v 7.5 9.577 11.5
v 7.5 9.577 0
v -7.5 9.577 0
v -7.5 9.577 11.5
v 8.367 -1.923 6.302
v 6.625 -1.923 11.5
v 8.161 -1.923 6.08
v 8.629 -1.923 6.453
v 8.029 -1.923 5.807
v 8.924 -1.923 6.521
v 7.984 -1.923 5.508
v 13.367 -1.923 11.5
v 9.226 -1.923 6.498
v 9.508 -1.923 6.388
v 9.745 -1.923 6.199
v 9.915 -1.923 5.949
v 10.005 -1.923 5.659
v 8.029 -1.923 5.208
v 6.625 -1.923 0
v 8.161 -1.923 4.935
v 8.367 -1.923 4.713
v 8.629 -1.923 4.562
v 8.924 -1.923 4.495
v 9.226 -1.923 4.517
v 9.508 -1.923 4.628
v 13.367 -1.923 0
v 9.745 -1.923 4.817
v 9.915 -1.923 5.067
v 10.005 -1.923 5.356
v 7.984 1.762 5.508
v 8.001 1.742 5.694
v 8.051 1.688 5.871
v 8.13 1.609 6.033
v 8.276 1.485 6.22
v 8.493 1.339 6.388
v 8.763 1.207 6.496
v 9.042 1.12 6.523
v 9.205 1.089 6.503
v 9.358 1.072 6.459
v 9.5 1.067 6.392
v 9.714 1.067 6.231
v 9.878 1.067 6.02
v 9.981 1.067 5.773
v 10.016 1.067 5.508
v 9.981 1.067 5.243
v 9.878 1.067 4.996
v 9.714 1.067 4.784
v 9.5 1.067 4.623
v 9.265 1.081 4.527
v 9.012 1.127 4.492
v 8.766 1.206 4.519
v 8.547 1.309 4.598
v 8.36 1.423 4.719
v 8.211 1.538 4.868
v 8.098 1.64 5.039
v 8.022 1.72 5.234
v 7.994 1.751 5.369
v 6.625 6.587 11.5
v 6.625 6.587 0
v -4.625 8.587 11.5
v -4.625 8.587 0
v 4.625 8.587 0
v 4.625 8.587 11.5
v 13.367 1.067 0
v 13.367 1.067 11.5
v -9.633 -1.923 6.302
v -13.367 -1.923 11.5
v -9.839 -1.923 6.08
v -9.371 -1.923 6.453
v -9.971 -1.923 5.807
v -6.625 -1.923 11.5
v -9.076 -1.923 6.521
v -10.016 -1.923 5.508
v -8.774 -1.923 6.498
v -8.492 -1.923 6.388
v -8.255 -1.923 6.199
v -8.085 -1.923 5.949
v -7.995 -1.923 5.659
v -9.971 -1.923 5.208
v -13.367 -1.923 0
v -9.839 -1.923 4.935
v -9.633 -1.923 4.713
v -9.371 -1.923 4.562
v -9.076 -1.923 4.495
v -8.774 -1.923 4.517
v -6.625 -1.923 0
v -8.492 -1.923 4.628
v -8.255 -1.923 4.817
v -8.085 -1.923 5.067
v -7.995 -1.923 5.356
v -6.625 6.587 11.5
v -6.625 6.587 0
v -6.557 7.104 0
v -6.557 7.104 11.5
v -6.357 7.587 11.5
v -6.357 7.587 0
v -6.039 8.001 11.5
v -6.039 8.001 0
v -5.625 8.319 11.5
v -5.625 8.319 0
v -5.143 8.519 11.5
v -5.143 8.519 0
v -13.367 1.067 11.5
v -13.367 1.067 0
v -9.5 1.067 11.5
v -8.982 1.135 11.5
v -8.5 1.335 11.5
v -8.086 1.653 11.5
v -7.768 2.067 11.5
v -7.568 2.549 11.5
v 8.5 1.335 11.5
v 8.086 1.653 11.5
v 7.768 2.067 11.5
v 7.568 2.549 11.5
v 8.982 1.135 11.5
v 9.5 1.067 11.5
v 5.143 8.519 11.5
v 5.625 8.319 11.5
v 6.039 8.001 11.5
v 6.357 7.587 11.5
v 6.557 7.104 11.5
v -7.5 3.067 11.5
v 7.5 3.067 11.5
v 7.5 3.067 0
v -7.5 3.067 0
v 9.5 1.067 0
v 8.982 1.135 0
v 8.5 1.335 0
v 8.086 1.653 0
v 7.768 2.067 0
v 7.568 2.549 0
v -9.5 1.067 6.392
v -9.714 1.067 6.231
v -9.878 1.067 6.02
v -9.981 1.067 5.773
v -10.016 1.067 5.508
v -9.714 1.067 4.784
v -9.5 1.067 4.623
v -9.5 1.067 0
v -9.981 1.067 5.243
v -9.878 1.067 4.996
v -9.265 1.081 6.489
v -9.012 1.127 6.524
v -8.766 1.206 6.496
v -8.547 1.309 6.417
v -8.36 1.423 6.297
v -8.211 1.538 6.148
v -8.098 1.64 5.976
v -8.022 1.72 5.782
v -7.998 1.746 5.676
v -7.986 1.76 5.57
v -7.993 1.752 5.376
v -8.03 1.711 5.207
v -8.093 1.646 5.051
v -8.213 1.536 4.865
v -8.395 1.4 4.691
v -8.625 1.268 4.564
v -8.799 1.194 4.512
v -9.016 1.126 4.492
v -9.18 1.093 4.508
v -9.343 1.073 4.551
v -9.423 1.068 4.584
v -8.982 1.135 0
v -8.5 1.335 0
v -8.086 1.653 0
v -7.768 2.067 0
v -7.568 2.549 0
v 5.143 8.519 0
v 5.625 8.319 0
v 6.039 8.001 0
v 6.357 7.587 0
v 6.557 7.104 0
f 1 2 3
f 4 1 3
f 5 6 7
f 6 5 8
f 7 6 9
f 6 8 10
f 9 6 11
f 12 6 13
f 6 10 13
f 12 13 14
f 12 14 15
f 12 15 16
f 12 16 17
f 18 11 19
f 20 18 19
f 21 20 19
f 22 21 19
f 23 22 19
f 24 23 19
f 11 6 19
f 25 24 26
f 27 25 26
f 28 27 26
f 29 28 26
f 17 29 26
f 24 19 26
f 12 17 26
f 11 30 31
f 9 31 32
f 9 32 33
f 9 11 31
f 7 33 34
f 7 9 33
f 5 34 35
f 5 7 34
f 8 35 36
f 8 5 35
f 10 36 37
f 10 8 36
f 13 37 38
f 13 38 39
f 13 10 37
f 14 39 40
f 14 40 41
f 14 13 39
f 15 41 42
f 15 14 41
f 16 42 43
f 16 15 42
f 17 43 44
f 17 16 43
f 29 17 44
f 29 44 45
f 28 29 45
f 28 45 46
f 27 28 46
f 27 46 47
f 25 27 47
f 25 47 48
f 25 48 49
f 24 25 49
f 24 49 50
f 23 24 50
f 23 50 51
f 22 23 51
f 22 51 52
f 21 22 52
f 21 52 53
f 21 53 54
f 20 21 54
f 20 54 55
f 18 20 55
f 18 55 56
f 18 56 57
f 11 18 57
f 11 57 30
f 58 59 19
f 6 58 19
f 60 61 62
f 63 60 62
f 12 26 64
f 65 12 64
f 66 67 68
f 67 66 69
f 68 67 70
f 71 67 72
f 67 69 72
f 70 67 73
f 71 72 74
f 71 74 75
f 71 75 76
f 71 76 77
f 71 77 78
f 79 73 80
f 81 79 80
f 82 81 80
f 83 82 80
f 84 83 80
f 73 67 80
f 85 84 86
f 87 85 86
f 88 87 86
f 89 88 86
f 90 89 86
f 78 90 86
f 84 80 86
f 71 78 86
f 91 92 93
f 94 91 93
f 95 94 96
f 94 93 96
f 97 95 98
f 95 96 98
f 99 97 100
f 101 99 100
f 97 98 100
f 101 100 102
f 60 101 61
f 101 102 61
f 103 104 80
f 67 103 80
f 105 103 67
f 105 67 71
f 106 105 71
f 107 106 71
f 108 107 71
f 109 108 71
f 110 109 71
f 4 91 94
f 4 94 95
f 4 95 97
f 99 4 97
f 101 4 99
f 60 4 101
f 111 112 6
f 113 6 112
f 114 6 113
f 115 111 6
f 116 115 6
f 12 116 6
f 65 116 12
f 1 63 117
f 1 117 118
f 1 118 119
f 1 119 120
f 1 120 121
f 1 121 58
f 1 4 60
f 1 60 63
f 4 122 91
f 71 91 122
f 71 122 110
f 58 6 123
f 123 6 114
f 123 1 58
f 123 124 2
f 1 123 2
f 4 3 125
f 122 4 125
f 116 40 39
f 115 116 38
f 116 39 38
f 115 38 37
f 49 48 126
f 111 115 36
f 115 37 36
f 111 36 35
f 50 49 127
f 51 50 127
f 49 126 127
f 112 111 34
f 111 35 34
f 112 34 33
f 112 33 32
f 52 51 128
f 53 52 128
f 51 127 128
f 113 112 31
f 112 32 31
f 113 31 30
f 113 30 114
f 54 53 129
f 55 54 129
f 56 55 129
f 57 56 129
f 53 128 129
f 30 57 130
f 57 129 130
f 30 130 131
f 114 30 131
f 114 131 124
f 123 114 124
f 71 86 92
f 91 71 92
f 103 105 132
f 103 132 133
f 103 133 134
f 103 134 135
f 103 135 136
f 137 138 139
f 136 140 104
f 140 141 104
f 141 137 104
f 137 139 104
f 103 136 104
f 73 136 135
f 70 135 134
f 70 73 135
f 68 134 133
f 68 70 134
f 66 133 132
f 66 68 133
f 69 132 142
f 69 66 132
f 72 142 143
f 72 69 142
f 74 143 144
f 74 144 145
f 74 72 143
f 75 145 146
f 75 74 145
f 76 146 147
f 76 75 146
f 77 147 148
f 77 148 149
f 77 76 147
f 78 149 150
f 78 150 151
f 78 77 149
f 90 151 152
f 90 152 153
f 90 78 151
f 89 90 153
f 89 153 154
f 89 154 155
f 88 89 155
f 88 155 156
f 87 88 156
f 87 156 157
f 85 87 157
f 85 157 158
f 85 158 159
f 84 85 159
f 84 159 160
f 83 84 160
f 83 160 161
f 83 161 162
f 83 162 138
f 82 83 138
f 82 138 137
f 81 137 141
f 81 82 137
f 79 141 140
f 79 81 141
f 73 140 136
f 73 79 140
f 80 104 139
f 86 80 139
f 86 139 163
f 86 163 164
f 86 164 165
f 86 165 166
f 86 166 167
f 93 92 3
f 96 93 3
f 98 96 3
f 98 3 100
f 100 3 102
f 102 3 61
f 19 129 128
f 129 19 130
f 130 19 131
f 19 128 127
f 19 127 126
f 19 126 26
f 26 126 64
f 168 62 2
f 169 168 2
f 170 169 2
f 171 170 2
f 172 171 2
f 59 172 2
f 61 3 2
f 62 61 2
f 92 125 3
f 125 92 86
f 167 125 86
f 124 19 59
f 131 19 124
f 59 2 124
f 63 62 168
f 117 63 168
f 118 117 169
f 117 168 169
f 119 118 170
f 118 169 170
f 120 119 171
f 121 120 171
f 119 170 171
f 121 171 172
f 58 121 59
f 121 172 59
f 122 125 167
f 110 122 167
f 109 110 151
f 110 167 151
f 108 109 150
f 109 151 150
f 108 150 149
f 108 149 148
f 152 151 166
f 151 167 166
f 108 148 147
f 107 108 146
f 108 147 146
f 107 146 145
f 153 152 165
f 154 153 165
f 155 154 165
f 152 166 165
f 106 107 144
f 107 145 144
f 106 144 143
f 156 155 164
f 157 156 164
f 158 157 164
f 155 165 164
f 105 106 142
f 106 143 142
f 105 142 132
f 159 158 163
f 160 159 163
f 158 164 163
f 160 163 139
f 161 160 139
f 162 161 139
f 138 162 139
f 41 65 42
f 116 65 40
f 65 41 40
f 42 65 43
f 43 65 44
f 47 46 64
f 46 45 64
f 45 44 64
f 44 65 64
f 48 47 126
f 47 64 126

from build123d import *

# Parameters (mm, degrees)
BOSS_EXTRUDE1_DEPTH     = 11.5
CUT_EXTRUDE2_DEPTH      = 20.579495528
CUT_EXTRUDE2_DEPTH_BACK = 20.579495528
SKETCH2_R               = 1.016


with BuildPart() as part:
    # Sketch1 → Boss-Extrude1 (new body)
    with BuildSketch(Plane.XY):
        with BuildLine():
            Line((7.5, 9.576744186), (0, 9.576744186))
            Line((0, 9.576744186), (0, 8.586804732))
            Line((0, 8.586804732), (4.625286285, 8.586804732))
            ThreePointArc((4.625286285, 8.586804732), (6.039499847, 8.001018294), (6.625286285, 6.586804732))
            Line((6.625286285, 6.586804732), (6.625286285, -1.923255814))
            Line((6.625286285, -1.923255814), (13.367366986, -1.923255814))
            Line((13.367366986, -1.923255814), (13.367366986, 1.066741541))
            Line((13.367366986, 1.066741541), (9.5, 1.066741541))
            ThreePointArc((9.5, 1.066741541), (8.085786438, 1.652527979), (7.5, 3.066741541))
            Line((7.5, 3.066741541), (7.5, 9.576744186))
        make_face()
        with BuildLine():
            Line((0, 9.576744186), (-7.5, 9.576744186))
            Line((-7.5, 9.576744186), (-7.5, 3.066741541))
            ThreePointArc((-7.5, 3.066741541), (-8.085786438, 1.652527979), (-9.5, 1.066741541))
            Line((-9.5, 1.066741541), (-13.367366986, 1.066741541))
            Line((-13.367366986, 1.066741541), (-13.367366986, -1.923255814))
            Line((-13.367366986, -1.923255814), (-6.625286285, -1.923255814))
            Line((-6.625286285, -1.923255814), (-6.625286285, 6.586804732))
            ThreePointArc((-6.625286285, 6.586804732), (-6.039499847, 8.001018294), (-4.625286285, 8.586804732))
            Line((-4.625286285, 8.586804732), (0, 8.586804732))
            Line((0, 8.586804732), (0, 9.576744186))
        make_face()
    extrude(amount=BOSS_EXTRUDE1_DEPTH)

    # Sketch2 → Cut-Extrude2 (cut, two sides: drawn at the far end of the back side and taken through both)
    with BuildSketch(Plane(origin=(0, 1.066741541, 0), x_dir=(1, 0, 0), z_dir=(0, 1, 0)).offset(-CUT_EXTRUDE2_DEPTH_BACK)):
        with Locations(Location((-9, -5.507720323, 0), (0, 0, 180))):
            Circle(SKETCH2_R)
        with Locations(Location((9, -5.507720323, 0), (0, 0, 180))):
            Circle(SKETCH2_R)
    extrude(amount=CUT_EXTRUDE2_DEPTH + CUT_EXTRUDE2_DEPTH_BACK, mode=Mode.SUBTRACT)


solid = part.part
